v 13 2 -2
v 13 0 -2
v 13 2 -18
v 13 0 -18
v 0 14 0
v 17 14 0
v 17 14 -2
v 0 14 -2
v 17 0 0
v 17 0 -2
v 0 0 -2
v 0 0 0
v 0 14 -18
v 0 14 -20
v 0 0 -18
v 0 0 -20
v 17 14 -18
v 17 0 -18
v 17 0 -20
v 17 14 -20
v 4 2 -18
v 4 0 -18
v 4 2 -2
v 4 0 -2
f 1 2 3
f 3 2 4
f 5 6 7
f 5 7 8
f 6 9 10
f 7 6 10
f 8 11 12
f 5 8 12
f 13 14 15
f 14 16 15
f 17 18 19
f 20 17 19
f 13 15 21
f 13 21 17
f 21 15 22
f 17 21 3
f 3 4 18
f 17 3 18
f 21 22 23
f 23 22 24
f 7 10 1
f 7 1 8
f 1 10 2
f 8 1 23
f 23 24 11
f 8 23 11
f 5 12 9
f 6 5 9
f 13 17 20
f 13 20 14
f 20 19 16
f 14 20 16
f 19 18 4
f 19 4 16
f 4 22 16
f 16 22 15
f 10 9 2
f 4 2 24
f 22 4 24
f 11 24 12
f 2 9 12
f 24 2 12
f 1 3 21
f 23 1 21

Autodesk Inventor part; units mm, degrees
ref_plane "YZ Plane" through (0, 0, 0) normal (1, 0, 0) x (0, 1, 0)
ref_plane "XZ Plane" through (0, 0, 0) normal (0, 1, 0) x (-1, 0, 0)
ref_plane "XY Plane" through (0, 0, 0) normal (0, 0, 1) x (1, 0, 0)
sketch "Sketch1" plane through (0, 0, 0) normal (0, 1, 0) x (-1, 0, 0)
  line L0 (0, 0) -> (-17, 0)
  line L1 (-17, 0) -> (-17, -2)
  line L2 (-17, -2) -> (0, -2)
  line L3 (0, -2) -> (0, 0)
  line L4 (0, -18) -> (-17, -18)
  line L5 (-17, -18) -> (-17, -20)
  line L6 (-17, -20) -> (0, -20)
  line L7 (0, -20) -> (0, -18)
  line L8 (-4, -2) -> (-13, -2)
  line L9 (-13, -2) -> (-13, -18)
  line L10 (-13, -18) -> (-4, -18)
  line L11 (-4, -18) -> (-4, -2)
  dimension "d0" = 17
  dimension "d1" = 2
  dimension "d2" = 17
  dimension "d3" = 2
  dimension "d4" = 16
  dimension "d7" = 4
  dimension "d8" = 4
extrude "Extrusion1" add sketch "Sketch1" along normal blind 14 contours L3 L2 L1 L0 | L4 L7 L6 L5
extrude "Extrusion2" add sketch "Sketch1" along normal blind 2 contours L11 L4 L9 L2
properties part number "drzakCudliku"
